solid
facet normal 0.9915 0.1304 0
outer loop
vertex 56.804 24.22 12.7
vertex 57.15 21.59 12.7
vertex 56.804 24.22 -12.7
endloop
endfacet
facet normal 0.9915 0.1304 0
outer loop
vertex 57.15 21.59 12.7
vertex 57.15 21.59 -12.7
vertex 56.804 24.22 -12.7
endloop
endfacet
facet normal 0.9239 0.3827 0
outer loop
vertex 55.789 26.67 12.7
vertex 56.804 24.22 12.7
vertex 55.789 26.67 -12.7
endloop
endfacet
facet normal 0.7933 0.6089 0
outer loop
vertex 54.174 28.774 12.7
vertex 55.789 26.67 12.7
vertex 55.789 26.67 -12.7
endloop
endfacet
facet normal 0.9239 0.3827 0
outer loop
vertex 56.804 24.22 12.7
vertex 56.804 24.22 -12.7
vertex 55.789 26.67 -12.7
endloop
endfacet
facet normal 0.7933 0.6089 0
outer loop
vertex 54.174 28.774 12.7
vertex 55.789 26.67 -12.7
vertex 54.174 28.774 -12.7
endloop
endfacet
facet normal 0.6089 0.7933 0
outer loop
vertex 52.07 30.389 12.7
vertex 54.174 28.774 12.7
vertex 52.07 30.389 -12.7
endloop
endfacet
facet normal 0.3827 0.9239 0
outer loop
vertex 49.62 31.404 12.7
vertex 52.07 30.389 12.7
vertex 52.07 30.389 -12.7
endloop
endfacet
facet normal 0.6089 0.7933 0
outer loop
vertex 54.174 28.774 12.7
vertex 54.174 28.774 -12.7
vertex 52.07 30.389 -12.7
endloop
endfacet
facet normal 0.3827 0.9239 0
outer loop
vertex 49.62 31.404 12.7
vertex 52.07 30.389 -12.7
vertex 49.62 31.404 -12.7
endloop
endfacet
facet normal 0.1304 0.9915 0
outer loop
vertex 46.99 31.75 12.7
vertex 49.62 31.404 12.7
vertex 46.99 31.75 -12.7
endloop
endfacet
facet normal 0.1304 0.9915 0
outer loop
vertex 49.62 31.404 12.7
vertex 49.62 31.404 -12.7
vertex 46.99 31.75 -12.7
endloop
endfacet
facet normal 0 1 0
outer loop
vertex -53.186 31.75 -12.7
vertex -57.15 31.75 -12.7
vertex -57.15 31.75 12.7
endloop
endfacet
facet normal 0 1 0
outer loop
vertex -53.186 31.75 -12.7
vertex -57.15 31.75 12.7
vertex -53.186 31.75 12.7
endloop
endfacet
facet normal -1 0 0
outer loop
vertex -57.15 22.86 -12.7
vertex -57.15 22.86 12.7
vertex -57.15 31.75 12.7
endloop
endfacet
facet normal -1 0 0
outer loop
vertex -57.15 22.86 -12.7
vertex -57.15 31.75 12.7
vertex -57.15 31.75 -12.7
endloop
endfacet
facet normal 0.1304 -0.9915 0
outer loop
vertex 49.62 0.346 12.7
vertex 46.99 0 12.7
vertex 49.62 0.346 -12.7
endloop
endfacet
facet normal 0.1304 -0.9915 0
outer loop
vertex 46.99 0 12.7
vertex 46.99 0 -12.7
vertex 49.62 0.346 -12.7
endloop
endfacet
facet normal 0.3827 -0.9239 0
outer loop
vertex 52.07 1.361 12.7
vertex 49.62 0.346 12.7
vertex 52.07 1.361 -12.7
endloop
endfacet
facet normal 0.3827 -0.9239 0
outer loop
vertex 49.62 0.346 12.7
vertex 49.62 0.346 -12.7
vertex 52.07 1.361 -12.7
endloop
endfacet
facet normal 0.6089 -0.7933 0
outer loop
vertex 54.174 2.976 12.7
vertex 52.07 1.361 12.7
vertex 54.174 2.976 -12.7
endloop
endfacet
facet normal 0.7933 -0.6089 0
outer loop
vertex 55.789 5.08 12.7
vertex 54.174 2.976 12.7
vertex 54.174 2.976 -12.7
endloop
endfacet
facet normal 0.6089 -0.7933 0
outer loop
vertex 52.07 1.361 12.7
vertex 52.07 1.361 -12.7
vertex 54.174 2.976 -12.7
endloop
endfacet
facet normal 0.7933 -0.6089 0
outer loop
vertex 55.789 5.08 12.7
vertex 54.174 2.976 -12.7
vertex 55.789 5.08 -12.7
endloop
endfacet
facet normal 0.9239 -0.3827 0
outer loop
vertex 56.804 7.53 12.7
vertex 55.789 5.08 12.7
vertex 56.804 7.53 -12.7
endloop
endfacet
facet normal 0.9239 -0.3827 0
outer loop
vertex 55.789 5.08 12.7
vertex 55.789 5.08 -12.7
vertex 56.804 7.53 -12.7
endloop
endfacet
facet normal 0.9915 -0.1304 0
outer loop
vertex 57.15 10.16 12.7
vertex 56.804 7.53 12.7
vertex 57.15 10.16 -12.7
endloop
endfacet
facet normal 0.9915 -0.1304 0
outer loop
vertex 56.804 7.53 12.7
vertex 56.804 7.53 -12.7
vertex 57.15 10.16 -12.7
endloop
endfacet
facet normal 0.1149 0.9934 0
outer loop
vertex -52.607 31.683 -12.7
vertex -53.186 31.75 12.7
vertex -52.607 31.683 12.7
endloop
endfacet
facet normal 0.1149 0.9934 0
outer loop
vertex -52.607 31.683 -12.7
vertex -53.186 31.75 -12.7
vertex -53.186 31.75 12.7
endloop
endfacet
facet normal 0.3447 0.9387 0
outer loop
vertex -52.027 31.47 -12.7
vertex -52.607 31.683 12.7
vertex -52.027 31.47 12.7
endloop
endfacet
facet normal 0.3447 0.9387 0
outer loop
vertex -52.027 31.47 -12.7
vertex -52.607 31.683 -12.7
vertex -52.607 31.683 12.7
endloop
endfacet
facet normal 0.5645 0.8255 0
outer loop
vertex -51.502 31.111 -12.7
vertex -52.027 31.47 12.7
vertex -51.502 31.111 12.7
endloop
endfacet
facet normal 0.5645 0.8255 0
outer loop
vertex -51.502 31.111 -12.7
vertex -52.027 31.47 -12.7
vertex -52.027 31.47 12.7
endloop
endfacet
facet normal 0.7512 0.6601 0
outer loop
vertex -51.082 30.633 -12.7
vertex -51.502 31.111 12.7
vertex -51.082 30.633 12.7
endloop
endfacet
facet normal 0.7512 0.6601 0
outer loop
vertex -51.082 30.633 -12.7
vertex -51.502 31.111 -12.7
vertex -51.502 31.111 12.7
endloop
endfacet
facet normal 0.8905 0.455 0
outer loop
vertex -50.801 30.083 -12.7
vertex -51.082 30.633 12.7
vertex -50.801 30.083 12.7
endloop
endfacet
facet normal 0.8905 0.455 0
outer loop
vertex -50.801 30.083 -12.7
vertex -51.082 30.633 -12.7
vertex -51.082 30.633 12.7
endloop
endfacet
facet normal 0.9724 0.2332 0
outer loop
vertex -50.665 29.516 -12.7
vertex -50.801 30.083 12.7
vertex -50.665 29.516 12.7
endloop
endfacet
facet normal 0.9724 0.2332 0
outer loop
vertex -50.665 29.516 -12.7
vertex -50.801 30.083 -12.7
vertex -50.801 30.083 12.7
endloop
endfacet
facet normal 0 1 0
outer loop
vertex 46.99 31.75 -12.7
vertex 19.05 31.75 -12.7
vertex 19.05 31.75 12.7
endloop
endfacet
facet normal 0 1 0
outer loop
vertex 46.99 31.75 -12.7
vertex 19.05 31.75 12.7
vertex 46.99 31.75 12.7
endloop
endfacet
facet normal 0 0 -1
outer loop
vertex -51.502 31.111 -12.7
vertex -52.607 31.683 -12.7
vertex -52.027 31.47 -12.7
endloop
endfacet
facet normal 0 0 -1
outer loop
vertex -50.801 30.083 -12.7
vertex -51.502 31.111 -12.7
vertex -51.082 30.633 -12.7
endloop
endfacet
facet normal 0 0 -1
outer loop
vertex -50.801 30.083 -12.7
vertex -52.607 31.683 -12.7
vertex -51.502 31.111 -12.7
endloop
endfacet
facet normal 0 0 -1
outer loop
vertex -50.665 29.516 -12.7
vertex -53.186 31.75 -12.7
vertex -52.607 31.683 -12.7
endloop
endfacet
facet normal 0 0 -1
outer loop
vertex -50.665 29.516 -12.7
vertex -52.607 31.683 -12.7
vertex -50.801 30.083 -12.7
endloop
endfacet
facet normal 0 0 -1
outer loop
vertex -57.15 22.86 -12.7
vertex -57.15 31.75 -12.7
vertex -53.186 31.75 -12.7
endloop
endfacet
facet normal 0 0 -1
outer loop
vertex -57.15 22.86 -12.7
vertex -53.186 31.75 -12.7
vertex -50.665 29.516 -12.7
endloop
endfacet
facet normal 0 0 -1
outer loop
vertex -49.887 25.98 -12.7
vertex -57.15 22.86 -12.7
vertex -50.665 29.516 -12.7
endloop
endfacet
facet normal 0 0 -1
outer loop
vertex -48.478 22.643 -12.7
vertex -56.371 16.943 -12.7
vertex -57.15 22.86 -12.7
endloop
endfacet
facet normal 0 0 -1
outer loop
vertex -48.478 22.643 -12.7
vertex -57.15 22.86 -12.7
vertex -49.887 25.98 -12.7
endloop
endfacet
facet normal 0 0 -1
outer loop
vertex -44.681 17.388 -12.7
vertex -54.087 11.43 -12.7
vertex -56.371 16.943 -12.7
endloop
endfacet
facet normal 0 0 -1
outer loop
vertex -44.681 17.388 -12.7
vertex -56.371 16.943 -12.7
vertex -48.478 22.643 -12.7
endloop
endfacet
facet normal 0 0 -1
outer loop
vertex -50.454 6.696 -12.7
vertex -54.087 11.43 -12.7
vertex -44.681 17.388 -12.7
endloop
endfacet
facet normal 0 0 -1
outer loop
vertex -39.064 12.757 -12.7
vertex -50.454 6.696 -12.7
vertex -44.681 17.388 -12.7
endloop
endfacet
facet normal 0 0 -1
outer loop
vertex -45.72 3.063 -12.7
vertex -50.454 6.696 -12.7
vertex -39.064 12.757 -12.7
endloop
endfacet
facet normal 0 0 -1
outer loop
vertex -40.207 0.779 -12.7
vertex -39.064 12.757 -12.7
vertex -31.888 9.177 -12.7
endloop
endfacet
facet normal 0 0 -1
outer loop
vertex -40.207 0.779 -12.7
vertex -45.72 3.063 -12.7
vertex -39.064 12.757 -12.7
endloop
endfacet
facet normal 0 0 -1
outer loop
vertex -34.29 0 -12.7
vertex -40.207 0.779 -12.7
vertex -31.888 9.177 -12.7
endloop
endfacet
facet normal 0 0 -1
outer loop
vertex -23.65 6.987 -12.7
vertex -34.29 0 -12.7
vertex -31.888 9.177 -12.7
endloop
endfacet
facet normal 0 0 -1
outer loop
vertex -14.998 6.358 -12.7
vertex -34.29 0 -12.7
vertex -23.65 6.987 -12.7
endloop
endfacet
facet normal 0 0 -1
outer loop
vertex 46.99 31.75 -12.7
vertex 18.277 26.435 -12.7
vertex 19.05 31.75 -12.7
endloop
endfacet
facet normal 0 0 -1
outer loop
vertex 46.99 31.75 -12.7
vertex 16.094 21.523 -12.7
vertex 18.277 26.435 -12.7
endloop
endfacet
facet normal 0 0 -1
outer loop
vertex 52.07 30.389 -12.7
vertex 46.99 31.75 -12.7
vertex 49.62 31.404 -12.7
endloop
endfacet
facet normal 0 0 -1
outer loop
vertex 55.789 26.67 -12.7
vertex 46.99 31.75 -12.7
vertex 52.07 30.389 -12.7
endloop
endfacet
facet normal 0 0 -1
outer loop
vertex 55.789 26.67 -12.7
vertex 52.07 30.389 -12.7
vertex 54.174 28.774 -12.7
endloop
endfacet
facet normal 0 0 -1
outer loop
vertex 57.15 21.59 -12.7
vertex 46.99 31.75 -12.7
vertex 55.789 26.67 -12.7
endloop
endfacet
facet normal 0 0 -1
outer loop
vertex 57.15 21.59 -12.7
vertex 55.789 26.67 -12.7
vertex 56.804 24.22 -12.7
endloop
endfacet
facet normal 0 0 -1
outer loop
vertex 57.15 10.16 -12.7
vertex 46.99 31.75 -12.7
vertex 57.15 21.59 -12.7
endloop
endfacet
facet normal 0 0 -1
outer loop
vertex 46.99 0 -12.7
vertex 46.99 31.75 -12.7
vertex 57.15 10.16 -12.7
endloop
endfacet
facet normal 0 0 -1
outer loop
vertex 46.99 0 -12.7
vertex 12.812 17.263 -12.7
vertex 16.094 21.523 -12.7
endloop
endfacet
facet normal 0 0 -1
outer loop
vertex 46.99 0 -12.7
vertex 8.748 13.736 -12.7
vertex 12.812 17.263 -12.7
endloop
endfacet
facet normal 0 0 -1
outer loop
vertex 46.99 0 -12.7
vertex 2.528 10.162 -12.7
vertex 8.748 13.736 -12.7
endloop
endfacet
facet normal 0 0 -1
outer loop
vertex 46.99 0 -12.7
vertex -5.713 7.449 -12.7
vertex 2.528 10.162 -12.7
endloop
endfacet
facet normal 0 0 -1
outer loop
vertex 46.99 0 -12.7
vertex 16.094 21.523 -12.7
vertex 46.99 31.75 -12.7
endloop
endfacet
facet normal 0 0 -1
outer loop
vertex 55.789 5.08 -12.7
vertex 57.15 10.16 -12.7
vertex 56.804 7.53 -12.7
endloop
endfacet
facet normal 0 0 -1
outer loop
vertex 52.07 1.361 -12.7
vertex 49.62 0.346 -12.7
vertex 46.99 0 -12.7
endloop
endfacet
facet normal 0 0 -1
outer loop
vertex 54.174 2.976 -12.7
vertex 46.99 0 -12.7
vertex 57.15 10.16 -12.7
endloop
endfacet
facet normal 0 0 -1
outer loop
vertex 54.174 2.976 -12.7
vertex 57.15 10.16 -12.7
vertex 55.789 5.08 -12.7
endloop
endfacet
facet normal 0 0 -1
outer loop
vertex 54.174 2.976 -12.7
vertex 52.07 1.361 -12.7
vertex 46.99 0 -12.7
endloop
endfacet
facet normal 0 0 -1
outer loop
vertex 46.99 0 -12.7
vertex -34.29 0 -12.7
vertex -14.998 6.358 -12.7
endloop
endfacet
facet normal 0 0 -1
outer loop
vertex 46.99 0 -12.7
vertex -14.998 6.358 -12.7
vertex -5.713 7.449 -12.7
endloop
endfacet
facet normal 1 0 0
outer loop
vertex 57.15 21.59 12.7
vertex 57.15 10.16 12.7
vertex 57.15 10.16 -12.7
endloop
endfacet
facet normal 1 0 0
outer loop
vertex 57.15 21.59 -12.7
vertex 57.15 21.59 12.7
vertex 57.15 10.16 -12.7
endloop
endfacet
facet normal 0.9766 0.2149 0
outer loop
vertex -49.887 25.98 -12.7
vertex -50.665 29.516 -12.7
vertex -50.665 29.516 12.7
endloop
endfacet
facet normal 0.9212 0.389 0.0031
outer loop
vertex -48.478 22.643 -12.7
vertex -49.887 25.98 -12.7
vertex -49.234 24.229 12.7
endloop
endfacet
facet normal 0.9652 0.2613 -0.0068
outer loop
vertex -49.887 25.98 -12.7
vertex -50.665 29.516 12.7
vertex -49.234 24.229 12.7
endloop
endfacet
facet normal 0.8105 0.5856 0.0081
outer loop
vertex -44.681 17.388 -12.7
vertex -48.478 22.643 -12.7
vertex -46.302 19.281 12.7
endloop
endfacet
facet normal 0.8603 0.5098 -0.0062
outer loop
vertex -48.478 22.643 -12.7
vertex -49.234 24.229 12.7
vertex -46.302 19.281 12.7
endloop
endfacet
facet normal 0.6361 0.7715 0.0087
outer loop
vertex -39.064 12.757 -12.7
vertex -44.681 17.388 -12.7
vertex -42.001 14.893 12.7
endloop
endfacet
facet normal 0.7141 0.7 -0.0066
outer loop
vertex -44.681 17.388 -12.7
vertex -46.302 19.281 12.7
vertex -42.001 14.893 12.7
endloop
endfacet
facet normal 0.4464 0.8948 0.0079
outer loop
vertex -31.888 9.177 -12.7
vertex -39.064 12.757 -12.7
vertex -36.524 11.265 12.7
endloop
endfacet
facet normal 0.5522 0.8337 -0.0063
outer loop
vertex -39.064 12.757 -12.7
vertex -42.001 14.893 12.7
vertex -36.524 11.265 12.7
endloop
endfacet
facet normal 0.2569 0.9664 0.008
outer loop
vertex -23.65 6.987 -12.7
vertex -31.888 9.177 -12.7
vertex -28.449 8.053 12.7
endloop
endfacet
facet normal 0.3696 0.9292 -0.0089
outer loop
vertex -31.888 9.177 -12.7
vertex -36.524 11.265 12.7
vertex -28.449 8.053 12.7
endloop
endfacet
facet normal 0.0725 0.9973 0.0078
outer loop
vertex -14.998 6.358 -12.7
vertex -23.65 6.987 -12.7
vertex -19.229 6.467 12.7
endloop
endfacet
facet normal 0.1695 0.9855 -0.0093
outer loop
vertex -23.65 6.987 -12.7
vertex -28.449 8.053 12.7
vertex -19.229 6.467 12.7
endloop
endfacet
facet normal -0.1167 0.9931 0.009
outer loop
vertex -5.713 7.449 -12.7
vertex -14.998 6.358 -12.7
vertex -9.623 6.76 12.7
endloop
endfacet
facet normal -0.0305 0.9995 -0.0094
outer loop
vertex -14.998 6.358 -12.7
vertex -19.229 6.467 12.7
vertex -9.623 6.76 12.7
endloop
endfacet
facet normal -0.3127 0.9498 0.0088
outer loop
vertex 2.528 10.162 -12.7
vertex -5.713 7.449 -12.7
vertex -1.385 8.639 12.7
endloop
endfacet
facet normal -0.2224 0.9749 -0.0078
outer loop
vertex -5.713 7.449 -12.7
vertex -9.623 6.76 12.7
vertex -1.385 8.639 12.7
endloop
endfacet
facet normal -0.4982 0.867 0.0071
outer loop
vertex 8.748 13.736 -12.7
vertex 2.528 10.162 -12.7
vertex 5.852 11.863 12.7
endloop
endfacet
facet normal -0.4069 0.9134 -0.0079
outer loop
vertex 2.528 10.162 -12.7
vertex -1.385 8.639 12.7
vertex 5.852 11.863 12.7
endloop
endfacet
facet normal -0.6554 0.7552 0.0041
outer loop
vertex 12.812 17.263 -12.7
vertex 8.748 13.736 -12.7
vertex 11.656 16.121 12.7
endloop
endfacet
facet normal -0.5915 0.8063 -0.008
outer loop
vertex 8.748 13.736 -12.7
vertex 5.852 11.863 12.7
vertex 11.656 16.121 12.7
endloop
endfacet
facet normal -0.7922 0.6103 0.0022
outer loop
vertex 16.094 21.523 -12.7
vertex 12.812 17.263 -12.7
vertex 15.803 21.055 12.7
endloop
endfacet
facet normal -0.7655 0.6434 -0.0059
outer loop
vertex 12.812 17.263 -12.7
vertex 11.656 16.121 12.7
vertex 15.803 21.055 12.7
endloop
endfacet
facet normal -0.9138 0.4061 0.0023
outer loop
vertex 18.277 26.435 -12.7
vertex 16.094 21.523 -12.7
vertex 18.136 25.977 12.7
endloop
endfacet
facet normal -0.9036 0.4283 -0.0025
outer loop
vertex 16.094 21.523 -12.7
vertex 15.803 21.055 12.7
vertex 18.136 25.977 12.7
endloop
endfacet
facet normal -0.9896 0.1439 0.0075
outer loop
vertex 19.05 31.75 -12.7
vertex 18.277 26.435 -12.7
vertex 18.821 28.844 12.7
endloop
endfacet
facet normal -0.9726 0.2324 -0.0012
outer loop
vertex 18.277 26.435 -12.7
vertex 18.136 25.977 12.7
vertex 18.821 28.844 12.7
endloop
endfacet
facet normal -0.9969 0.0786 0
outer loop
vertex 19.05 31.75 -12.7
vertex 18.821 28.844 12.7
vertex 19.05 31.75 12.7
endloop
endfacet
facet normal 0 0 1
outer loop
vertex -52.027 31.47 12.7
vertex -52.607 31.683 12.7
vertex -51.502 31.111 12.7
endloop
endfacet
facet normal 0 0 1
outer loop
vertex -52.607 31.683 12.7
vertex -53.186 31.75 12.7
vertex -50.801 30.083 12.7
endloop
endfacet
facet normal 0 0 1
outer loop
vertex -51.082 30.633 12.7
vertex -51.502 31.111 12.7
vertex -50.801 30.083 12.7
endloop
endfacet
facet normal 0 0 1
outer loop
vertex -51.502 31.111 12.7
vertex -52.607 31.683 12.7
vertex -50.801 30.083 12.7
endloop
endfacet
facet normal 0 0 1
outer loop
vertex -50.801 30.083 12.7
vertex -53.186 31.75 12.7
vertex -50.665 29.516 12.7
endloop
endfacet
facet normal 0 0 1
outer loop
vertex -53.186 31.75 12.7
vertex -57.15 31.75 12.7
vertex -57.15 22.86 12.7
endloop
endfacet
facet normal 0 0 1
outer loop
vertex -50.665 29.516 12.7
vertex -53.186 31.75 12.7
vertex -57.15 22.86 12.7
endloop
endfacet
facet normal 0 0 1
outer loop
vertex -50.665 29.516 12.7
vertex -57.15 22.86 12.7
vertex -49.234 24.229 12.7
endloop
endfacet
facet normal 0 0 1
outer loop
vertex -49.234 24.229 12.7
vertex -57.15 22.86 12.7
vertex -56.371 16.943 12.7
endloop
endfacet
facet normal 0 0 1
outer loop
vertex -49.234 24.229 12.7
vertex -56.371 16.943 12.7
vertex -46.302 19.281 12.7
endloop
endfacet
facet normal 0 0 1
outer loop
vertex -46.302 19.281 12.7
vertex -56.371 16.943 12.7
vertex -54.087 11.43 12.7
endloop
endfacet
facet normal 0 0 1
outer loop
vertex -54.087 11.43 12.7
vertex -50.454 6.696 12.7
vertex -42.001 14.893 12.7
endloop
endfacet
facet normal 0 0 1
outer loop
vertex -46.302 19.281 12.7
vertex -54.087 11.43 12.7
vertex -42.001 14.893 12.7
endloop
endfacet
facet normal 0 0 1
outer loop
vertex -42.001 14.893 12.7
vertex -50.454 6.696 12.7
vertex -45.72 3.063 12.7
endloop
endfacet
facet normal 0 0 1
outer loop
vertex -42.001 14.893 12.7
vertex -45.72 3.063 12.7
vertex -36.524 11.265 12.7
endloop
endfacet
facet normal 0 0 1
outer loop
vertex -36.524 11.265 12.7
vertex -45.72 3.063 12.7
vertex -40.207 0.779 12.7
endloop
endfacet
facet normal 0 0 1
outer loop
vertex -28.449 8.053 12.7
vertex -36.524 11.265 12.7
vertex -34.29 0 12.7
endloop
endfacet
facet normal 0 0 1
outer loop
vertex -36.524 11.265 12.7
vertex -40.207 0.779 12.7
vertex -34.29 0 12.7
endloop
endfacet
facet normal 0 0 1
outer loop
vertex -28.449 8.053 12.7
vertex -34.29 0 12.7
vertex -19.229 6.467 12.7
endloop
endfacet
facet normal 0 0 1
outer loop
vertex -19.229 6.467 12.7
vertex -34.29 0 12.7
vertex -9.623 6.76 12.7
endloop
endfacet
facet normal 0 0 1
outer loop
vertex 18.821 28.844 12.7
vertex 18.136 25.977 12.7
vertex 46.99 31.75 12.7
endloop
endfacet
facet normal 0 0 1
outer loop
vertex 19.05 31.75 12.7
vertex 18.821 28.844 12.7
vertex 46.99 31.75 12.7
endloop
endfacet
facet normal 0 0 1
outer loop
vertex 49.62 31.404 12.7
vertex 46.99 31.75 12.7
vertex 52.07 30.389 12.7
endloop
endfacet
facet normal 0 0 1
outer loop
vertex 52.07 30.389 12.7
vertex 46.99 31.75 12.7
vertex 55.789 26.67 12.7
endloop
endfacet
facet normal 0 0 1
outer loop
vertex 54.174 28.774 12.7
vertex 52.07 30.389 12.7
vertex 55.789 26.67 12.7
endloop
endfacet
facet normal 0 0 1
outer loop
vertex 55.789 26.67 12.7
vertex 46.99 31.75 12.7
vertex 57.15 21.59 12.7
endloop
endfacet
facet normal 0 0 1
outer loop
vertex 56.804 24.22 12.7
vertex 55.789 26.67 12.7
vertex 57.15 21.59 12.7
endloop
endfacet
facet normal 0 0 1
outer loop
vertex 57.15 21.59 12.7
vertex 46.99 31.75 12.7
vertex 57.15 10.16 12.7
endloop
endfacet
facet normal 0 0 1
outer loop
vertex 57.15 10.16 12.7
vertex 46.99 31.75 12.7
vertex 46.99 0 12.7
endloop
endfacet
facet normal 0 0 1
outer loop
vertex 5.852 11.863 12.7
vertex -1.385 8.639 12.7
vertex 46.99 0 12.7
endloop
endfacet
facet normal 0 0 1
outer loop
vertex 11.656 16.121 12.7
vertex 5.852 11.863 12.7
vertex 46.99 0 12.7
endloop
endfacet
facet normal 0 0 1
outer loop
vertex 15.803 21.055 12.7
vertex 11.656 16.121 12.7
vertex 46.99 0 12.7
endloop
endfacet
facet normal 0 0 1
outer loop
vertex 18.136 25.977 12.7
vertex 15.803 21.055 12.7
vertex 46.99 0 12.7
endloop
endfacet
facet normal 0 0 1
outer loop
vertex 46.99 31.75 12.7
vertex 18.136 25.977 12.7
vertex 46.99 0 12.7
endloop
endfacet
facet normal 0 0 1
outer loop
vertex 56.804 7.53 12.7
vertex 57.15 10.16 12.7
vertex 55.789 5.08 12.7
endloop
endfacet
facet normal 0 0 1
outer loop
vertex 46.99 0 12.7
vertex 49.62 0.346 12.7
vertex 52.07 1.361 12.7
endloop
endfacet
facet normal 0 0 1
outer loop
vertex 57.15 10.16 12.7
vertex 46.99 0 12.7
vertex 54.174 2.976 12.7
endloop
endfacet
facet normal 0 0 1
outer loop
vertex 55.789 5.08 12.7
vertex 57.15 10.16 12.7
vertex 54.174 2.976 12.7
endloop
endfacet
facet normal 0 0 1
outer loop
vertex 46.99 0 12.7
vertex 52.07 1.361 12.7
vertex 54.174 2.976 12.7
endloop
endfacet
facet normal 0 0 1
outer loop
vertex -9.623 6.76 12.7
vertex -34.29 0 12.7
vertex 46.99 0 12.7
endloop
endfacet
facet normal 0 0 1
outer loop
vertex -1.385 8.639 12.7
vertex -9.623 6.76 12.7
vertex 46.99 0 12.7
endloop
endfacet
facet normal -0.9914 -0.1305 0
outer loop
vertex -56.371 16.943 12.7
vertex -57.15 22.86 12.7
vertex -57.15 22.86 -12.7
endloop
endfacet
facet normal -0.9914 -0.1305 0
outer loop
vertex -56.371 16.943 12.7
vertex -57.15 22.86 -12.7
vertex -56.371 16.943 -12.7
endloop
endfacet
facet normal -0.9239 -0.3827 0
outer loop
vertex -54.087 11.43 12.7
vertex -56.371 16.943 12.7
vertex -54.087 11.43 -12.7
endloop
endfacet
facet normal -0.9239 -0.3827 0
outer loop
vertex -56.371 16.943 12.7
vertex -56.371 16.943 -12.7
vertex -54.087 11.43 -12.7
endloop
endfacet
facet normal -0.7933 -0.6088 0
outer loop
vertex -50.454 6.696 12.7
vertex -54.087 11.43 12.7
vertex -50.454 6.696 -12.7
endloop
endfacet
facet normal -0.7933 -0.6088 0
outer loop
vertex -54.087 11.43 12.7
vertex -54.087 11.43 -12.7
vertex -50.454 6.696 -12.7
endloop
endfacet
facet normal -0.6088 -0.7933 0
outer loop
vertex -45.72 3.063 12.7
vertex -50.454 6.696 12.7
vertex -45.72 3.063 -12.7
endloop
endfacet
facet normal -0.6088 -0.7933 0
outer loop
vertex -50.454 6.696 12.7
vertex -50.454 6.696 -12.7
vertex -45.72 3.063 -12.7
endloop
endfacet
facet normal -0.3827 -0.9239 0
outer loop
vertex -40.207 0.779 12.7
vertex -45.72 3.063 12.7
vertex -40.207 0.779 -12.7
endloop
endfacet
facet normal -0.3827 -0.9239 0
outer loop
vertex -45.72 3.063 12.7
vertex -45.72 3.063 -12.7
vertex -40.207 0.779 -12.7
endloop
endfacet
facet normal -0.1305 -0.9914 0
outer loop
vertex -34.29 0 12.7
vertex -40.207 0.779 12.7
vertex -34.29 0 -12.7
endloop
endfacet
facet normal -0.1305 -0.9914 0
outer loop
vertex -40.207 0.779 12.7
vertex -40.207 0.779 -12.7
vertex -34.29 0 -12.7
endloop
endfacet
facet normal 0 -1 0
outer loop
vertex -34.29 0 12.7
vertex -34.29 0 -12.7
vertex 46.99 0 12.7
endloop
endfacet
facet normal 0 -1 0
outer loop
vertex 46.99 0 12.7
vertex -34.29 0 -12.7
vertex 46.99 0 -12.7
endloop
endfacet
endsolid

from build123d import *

# Parameters (mm, degrees)
SKETCH1_W           = 114.3
SKETCH1_H           = 25.4
BOSS_EXTRUDE1_DEPTH = 31.75
SKETCH2_RX          = 34.925
SKETCH2_RY          = 25.4
CUT_EXTRUDE1_DEPTH  = 71.138042459
FILLET1_R           = 2.54
FILLET2_R           = 22.86
FILLET3_R           = 10.16


with BuildPart() as part:
    # Sketch1 → Boss-Extrude1 (new body)
    with BuildSketch(Plane(origin=(0, 0, 0), x_dir=(1, 0, 0), z_dir=(0, 1, 0))):
        Rectangle(SKETCH1_W, SKETCH1_H)
    extrude(amount=BOSS_EXTRUDE1_DEPTH)

    # Sketch2 → Cut-Extrude1 (cut, through all)
    with BuildSketch(Plane.XY.offset(12.7)):
        with Locations(Location((-15.875, 31.75), (0, 0, 180))):
            Ellipse(SKETCH2_RX, SKETCH2_RY)
    extrude(amount=-CUT_EXTRUDE1_DEPTH, mode=Mode.SUBTRACT)

    # Fillet1
    fillet1_edges = [part.edges().sort_by_distance(p)[0] for p in [
        (-50.8, 31.75, 0),
    ]]
    fillet(fillet1_edges, radius=FILLET1_R)

    # Fillet2
    fillet2_edges = [part.edges().sort_by_distance(p)[0] for p in [
        (-57.15, 0, 0),
    ]]
    fillet(fillet2_edges, radius=FILLET2_R)

    # Fillet3
    fillet3_edges = [part.edges().sort_by_distance(p)[0] for p in [
        (57.15, 31.75, 0),
        (57.15, 0, 0),
    ]]
    fillet(fillet3_edges, radius=FILLET3_R)


solid = part.part
